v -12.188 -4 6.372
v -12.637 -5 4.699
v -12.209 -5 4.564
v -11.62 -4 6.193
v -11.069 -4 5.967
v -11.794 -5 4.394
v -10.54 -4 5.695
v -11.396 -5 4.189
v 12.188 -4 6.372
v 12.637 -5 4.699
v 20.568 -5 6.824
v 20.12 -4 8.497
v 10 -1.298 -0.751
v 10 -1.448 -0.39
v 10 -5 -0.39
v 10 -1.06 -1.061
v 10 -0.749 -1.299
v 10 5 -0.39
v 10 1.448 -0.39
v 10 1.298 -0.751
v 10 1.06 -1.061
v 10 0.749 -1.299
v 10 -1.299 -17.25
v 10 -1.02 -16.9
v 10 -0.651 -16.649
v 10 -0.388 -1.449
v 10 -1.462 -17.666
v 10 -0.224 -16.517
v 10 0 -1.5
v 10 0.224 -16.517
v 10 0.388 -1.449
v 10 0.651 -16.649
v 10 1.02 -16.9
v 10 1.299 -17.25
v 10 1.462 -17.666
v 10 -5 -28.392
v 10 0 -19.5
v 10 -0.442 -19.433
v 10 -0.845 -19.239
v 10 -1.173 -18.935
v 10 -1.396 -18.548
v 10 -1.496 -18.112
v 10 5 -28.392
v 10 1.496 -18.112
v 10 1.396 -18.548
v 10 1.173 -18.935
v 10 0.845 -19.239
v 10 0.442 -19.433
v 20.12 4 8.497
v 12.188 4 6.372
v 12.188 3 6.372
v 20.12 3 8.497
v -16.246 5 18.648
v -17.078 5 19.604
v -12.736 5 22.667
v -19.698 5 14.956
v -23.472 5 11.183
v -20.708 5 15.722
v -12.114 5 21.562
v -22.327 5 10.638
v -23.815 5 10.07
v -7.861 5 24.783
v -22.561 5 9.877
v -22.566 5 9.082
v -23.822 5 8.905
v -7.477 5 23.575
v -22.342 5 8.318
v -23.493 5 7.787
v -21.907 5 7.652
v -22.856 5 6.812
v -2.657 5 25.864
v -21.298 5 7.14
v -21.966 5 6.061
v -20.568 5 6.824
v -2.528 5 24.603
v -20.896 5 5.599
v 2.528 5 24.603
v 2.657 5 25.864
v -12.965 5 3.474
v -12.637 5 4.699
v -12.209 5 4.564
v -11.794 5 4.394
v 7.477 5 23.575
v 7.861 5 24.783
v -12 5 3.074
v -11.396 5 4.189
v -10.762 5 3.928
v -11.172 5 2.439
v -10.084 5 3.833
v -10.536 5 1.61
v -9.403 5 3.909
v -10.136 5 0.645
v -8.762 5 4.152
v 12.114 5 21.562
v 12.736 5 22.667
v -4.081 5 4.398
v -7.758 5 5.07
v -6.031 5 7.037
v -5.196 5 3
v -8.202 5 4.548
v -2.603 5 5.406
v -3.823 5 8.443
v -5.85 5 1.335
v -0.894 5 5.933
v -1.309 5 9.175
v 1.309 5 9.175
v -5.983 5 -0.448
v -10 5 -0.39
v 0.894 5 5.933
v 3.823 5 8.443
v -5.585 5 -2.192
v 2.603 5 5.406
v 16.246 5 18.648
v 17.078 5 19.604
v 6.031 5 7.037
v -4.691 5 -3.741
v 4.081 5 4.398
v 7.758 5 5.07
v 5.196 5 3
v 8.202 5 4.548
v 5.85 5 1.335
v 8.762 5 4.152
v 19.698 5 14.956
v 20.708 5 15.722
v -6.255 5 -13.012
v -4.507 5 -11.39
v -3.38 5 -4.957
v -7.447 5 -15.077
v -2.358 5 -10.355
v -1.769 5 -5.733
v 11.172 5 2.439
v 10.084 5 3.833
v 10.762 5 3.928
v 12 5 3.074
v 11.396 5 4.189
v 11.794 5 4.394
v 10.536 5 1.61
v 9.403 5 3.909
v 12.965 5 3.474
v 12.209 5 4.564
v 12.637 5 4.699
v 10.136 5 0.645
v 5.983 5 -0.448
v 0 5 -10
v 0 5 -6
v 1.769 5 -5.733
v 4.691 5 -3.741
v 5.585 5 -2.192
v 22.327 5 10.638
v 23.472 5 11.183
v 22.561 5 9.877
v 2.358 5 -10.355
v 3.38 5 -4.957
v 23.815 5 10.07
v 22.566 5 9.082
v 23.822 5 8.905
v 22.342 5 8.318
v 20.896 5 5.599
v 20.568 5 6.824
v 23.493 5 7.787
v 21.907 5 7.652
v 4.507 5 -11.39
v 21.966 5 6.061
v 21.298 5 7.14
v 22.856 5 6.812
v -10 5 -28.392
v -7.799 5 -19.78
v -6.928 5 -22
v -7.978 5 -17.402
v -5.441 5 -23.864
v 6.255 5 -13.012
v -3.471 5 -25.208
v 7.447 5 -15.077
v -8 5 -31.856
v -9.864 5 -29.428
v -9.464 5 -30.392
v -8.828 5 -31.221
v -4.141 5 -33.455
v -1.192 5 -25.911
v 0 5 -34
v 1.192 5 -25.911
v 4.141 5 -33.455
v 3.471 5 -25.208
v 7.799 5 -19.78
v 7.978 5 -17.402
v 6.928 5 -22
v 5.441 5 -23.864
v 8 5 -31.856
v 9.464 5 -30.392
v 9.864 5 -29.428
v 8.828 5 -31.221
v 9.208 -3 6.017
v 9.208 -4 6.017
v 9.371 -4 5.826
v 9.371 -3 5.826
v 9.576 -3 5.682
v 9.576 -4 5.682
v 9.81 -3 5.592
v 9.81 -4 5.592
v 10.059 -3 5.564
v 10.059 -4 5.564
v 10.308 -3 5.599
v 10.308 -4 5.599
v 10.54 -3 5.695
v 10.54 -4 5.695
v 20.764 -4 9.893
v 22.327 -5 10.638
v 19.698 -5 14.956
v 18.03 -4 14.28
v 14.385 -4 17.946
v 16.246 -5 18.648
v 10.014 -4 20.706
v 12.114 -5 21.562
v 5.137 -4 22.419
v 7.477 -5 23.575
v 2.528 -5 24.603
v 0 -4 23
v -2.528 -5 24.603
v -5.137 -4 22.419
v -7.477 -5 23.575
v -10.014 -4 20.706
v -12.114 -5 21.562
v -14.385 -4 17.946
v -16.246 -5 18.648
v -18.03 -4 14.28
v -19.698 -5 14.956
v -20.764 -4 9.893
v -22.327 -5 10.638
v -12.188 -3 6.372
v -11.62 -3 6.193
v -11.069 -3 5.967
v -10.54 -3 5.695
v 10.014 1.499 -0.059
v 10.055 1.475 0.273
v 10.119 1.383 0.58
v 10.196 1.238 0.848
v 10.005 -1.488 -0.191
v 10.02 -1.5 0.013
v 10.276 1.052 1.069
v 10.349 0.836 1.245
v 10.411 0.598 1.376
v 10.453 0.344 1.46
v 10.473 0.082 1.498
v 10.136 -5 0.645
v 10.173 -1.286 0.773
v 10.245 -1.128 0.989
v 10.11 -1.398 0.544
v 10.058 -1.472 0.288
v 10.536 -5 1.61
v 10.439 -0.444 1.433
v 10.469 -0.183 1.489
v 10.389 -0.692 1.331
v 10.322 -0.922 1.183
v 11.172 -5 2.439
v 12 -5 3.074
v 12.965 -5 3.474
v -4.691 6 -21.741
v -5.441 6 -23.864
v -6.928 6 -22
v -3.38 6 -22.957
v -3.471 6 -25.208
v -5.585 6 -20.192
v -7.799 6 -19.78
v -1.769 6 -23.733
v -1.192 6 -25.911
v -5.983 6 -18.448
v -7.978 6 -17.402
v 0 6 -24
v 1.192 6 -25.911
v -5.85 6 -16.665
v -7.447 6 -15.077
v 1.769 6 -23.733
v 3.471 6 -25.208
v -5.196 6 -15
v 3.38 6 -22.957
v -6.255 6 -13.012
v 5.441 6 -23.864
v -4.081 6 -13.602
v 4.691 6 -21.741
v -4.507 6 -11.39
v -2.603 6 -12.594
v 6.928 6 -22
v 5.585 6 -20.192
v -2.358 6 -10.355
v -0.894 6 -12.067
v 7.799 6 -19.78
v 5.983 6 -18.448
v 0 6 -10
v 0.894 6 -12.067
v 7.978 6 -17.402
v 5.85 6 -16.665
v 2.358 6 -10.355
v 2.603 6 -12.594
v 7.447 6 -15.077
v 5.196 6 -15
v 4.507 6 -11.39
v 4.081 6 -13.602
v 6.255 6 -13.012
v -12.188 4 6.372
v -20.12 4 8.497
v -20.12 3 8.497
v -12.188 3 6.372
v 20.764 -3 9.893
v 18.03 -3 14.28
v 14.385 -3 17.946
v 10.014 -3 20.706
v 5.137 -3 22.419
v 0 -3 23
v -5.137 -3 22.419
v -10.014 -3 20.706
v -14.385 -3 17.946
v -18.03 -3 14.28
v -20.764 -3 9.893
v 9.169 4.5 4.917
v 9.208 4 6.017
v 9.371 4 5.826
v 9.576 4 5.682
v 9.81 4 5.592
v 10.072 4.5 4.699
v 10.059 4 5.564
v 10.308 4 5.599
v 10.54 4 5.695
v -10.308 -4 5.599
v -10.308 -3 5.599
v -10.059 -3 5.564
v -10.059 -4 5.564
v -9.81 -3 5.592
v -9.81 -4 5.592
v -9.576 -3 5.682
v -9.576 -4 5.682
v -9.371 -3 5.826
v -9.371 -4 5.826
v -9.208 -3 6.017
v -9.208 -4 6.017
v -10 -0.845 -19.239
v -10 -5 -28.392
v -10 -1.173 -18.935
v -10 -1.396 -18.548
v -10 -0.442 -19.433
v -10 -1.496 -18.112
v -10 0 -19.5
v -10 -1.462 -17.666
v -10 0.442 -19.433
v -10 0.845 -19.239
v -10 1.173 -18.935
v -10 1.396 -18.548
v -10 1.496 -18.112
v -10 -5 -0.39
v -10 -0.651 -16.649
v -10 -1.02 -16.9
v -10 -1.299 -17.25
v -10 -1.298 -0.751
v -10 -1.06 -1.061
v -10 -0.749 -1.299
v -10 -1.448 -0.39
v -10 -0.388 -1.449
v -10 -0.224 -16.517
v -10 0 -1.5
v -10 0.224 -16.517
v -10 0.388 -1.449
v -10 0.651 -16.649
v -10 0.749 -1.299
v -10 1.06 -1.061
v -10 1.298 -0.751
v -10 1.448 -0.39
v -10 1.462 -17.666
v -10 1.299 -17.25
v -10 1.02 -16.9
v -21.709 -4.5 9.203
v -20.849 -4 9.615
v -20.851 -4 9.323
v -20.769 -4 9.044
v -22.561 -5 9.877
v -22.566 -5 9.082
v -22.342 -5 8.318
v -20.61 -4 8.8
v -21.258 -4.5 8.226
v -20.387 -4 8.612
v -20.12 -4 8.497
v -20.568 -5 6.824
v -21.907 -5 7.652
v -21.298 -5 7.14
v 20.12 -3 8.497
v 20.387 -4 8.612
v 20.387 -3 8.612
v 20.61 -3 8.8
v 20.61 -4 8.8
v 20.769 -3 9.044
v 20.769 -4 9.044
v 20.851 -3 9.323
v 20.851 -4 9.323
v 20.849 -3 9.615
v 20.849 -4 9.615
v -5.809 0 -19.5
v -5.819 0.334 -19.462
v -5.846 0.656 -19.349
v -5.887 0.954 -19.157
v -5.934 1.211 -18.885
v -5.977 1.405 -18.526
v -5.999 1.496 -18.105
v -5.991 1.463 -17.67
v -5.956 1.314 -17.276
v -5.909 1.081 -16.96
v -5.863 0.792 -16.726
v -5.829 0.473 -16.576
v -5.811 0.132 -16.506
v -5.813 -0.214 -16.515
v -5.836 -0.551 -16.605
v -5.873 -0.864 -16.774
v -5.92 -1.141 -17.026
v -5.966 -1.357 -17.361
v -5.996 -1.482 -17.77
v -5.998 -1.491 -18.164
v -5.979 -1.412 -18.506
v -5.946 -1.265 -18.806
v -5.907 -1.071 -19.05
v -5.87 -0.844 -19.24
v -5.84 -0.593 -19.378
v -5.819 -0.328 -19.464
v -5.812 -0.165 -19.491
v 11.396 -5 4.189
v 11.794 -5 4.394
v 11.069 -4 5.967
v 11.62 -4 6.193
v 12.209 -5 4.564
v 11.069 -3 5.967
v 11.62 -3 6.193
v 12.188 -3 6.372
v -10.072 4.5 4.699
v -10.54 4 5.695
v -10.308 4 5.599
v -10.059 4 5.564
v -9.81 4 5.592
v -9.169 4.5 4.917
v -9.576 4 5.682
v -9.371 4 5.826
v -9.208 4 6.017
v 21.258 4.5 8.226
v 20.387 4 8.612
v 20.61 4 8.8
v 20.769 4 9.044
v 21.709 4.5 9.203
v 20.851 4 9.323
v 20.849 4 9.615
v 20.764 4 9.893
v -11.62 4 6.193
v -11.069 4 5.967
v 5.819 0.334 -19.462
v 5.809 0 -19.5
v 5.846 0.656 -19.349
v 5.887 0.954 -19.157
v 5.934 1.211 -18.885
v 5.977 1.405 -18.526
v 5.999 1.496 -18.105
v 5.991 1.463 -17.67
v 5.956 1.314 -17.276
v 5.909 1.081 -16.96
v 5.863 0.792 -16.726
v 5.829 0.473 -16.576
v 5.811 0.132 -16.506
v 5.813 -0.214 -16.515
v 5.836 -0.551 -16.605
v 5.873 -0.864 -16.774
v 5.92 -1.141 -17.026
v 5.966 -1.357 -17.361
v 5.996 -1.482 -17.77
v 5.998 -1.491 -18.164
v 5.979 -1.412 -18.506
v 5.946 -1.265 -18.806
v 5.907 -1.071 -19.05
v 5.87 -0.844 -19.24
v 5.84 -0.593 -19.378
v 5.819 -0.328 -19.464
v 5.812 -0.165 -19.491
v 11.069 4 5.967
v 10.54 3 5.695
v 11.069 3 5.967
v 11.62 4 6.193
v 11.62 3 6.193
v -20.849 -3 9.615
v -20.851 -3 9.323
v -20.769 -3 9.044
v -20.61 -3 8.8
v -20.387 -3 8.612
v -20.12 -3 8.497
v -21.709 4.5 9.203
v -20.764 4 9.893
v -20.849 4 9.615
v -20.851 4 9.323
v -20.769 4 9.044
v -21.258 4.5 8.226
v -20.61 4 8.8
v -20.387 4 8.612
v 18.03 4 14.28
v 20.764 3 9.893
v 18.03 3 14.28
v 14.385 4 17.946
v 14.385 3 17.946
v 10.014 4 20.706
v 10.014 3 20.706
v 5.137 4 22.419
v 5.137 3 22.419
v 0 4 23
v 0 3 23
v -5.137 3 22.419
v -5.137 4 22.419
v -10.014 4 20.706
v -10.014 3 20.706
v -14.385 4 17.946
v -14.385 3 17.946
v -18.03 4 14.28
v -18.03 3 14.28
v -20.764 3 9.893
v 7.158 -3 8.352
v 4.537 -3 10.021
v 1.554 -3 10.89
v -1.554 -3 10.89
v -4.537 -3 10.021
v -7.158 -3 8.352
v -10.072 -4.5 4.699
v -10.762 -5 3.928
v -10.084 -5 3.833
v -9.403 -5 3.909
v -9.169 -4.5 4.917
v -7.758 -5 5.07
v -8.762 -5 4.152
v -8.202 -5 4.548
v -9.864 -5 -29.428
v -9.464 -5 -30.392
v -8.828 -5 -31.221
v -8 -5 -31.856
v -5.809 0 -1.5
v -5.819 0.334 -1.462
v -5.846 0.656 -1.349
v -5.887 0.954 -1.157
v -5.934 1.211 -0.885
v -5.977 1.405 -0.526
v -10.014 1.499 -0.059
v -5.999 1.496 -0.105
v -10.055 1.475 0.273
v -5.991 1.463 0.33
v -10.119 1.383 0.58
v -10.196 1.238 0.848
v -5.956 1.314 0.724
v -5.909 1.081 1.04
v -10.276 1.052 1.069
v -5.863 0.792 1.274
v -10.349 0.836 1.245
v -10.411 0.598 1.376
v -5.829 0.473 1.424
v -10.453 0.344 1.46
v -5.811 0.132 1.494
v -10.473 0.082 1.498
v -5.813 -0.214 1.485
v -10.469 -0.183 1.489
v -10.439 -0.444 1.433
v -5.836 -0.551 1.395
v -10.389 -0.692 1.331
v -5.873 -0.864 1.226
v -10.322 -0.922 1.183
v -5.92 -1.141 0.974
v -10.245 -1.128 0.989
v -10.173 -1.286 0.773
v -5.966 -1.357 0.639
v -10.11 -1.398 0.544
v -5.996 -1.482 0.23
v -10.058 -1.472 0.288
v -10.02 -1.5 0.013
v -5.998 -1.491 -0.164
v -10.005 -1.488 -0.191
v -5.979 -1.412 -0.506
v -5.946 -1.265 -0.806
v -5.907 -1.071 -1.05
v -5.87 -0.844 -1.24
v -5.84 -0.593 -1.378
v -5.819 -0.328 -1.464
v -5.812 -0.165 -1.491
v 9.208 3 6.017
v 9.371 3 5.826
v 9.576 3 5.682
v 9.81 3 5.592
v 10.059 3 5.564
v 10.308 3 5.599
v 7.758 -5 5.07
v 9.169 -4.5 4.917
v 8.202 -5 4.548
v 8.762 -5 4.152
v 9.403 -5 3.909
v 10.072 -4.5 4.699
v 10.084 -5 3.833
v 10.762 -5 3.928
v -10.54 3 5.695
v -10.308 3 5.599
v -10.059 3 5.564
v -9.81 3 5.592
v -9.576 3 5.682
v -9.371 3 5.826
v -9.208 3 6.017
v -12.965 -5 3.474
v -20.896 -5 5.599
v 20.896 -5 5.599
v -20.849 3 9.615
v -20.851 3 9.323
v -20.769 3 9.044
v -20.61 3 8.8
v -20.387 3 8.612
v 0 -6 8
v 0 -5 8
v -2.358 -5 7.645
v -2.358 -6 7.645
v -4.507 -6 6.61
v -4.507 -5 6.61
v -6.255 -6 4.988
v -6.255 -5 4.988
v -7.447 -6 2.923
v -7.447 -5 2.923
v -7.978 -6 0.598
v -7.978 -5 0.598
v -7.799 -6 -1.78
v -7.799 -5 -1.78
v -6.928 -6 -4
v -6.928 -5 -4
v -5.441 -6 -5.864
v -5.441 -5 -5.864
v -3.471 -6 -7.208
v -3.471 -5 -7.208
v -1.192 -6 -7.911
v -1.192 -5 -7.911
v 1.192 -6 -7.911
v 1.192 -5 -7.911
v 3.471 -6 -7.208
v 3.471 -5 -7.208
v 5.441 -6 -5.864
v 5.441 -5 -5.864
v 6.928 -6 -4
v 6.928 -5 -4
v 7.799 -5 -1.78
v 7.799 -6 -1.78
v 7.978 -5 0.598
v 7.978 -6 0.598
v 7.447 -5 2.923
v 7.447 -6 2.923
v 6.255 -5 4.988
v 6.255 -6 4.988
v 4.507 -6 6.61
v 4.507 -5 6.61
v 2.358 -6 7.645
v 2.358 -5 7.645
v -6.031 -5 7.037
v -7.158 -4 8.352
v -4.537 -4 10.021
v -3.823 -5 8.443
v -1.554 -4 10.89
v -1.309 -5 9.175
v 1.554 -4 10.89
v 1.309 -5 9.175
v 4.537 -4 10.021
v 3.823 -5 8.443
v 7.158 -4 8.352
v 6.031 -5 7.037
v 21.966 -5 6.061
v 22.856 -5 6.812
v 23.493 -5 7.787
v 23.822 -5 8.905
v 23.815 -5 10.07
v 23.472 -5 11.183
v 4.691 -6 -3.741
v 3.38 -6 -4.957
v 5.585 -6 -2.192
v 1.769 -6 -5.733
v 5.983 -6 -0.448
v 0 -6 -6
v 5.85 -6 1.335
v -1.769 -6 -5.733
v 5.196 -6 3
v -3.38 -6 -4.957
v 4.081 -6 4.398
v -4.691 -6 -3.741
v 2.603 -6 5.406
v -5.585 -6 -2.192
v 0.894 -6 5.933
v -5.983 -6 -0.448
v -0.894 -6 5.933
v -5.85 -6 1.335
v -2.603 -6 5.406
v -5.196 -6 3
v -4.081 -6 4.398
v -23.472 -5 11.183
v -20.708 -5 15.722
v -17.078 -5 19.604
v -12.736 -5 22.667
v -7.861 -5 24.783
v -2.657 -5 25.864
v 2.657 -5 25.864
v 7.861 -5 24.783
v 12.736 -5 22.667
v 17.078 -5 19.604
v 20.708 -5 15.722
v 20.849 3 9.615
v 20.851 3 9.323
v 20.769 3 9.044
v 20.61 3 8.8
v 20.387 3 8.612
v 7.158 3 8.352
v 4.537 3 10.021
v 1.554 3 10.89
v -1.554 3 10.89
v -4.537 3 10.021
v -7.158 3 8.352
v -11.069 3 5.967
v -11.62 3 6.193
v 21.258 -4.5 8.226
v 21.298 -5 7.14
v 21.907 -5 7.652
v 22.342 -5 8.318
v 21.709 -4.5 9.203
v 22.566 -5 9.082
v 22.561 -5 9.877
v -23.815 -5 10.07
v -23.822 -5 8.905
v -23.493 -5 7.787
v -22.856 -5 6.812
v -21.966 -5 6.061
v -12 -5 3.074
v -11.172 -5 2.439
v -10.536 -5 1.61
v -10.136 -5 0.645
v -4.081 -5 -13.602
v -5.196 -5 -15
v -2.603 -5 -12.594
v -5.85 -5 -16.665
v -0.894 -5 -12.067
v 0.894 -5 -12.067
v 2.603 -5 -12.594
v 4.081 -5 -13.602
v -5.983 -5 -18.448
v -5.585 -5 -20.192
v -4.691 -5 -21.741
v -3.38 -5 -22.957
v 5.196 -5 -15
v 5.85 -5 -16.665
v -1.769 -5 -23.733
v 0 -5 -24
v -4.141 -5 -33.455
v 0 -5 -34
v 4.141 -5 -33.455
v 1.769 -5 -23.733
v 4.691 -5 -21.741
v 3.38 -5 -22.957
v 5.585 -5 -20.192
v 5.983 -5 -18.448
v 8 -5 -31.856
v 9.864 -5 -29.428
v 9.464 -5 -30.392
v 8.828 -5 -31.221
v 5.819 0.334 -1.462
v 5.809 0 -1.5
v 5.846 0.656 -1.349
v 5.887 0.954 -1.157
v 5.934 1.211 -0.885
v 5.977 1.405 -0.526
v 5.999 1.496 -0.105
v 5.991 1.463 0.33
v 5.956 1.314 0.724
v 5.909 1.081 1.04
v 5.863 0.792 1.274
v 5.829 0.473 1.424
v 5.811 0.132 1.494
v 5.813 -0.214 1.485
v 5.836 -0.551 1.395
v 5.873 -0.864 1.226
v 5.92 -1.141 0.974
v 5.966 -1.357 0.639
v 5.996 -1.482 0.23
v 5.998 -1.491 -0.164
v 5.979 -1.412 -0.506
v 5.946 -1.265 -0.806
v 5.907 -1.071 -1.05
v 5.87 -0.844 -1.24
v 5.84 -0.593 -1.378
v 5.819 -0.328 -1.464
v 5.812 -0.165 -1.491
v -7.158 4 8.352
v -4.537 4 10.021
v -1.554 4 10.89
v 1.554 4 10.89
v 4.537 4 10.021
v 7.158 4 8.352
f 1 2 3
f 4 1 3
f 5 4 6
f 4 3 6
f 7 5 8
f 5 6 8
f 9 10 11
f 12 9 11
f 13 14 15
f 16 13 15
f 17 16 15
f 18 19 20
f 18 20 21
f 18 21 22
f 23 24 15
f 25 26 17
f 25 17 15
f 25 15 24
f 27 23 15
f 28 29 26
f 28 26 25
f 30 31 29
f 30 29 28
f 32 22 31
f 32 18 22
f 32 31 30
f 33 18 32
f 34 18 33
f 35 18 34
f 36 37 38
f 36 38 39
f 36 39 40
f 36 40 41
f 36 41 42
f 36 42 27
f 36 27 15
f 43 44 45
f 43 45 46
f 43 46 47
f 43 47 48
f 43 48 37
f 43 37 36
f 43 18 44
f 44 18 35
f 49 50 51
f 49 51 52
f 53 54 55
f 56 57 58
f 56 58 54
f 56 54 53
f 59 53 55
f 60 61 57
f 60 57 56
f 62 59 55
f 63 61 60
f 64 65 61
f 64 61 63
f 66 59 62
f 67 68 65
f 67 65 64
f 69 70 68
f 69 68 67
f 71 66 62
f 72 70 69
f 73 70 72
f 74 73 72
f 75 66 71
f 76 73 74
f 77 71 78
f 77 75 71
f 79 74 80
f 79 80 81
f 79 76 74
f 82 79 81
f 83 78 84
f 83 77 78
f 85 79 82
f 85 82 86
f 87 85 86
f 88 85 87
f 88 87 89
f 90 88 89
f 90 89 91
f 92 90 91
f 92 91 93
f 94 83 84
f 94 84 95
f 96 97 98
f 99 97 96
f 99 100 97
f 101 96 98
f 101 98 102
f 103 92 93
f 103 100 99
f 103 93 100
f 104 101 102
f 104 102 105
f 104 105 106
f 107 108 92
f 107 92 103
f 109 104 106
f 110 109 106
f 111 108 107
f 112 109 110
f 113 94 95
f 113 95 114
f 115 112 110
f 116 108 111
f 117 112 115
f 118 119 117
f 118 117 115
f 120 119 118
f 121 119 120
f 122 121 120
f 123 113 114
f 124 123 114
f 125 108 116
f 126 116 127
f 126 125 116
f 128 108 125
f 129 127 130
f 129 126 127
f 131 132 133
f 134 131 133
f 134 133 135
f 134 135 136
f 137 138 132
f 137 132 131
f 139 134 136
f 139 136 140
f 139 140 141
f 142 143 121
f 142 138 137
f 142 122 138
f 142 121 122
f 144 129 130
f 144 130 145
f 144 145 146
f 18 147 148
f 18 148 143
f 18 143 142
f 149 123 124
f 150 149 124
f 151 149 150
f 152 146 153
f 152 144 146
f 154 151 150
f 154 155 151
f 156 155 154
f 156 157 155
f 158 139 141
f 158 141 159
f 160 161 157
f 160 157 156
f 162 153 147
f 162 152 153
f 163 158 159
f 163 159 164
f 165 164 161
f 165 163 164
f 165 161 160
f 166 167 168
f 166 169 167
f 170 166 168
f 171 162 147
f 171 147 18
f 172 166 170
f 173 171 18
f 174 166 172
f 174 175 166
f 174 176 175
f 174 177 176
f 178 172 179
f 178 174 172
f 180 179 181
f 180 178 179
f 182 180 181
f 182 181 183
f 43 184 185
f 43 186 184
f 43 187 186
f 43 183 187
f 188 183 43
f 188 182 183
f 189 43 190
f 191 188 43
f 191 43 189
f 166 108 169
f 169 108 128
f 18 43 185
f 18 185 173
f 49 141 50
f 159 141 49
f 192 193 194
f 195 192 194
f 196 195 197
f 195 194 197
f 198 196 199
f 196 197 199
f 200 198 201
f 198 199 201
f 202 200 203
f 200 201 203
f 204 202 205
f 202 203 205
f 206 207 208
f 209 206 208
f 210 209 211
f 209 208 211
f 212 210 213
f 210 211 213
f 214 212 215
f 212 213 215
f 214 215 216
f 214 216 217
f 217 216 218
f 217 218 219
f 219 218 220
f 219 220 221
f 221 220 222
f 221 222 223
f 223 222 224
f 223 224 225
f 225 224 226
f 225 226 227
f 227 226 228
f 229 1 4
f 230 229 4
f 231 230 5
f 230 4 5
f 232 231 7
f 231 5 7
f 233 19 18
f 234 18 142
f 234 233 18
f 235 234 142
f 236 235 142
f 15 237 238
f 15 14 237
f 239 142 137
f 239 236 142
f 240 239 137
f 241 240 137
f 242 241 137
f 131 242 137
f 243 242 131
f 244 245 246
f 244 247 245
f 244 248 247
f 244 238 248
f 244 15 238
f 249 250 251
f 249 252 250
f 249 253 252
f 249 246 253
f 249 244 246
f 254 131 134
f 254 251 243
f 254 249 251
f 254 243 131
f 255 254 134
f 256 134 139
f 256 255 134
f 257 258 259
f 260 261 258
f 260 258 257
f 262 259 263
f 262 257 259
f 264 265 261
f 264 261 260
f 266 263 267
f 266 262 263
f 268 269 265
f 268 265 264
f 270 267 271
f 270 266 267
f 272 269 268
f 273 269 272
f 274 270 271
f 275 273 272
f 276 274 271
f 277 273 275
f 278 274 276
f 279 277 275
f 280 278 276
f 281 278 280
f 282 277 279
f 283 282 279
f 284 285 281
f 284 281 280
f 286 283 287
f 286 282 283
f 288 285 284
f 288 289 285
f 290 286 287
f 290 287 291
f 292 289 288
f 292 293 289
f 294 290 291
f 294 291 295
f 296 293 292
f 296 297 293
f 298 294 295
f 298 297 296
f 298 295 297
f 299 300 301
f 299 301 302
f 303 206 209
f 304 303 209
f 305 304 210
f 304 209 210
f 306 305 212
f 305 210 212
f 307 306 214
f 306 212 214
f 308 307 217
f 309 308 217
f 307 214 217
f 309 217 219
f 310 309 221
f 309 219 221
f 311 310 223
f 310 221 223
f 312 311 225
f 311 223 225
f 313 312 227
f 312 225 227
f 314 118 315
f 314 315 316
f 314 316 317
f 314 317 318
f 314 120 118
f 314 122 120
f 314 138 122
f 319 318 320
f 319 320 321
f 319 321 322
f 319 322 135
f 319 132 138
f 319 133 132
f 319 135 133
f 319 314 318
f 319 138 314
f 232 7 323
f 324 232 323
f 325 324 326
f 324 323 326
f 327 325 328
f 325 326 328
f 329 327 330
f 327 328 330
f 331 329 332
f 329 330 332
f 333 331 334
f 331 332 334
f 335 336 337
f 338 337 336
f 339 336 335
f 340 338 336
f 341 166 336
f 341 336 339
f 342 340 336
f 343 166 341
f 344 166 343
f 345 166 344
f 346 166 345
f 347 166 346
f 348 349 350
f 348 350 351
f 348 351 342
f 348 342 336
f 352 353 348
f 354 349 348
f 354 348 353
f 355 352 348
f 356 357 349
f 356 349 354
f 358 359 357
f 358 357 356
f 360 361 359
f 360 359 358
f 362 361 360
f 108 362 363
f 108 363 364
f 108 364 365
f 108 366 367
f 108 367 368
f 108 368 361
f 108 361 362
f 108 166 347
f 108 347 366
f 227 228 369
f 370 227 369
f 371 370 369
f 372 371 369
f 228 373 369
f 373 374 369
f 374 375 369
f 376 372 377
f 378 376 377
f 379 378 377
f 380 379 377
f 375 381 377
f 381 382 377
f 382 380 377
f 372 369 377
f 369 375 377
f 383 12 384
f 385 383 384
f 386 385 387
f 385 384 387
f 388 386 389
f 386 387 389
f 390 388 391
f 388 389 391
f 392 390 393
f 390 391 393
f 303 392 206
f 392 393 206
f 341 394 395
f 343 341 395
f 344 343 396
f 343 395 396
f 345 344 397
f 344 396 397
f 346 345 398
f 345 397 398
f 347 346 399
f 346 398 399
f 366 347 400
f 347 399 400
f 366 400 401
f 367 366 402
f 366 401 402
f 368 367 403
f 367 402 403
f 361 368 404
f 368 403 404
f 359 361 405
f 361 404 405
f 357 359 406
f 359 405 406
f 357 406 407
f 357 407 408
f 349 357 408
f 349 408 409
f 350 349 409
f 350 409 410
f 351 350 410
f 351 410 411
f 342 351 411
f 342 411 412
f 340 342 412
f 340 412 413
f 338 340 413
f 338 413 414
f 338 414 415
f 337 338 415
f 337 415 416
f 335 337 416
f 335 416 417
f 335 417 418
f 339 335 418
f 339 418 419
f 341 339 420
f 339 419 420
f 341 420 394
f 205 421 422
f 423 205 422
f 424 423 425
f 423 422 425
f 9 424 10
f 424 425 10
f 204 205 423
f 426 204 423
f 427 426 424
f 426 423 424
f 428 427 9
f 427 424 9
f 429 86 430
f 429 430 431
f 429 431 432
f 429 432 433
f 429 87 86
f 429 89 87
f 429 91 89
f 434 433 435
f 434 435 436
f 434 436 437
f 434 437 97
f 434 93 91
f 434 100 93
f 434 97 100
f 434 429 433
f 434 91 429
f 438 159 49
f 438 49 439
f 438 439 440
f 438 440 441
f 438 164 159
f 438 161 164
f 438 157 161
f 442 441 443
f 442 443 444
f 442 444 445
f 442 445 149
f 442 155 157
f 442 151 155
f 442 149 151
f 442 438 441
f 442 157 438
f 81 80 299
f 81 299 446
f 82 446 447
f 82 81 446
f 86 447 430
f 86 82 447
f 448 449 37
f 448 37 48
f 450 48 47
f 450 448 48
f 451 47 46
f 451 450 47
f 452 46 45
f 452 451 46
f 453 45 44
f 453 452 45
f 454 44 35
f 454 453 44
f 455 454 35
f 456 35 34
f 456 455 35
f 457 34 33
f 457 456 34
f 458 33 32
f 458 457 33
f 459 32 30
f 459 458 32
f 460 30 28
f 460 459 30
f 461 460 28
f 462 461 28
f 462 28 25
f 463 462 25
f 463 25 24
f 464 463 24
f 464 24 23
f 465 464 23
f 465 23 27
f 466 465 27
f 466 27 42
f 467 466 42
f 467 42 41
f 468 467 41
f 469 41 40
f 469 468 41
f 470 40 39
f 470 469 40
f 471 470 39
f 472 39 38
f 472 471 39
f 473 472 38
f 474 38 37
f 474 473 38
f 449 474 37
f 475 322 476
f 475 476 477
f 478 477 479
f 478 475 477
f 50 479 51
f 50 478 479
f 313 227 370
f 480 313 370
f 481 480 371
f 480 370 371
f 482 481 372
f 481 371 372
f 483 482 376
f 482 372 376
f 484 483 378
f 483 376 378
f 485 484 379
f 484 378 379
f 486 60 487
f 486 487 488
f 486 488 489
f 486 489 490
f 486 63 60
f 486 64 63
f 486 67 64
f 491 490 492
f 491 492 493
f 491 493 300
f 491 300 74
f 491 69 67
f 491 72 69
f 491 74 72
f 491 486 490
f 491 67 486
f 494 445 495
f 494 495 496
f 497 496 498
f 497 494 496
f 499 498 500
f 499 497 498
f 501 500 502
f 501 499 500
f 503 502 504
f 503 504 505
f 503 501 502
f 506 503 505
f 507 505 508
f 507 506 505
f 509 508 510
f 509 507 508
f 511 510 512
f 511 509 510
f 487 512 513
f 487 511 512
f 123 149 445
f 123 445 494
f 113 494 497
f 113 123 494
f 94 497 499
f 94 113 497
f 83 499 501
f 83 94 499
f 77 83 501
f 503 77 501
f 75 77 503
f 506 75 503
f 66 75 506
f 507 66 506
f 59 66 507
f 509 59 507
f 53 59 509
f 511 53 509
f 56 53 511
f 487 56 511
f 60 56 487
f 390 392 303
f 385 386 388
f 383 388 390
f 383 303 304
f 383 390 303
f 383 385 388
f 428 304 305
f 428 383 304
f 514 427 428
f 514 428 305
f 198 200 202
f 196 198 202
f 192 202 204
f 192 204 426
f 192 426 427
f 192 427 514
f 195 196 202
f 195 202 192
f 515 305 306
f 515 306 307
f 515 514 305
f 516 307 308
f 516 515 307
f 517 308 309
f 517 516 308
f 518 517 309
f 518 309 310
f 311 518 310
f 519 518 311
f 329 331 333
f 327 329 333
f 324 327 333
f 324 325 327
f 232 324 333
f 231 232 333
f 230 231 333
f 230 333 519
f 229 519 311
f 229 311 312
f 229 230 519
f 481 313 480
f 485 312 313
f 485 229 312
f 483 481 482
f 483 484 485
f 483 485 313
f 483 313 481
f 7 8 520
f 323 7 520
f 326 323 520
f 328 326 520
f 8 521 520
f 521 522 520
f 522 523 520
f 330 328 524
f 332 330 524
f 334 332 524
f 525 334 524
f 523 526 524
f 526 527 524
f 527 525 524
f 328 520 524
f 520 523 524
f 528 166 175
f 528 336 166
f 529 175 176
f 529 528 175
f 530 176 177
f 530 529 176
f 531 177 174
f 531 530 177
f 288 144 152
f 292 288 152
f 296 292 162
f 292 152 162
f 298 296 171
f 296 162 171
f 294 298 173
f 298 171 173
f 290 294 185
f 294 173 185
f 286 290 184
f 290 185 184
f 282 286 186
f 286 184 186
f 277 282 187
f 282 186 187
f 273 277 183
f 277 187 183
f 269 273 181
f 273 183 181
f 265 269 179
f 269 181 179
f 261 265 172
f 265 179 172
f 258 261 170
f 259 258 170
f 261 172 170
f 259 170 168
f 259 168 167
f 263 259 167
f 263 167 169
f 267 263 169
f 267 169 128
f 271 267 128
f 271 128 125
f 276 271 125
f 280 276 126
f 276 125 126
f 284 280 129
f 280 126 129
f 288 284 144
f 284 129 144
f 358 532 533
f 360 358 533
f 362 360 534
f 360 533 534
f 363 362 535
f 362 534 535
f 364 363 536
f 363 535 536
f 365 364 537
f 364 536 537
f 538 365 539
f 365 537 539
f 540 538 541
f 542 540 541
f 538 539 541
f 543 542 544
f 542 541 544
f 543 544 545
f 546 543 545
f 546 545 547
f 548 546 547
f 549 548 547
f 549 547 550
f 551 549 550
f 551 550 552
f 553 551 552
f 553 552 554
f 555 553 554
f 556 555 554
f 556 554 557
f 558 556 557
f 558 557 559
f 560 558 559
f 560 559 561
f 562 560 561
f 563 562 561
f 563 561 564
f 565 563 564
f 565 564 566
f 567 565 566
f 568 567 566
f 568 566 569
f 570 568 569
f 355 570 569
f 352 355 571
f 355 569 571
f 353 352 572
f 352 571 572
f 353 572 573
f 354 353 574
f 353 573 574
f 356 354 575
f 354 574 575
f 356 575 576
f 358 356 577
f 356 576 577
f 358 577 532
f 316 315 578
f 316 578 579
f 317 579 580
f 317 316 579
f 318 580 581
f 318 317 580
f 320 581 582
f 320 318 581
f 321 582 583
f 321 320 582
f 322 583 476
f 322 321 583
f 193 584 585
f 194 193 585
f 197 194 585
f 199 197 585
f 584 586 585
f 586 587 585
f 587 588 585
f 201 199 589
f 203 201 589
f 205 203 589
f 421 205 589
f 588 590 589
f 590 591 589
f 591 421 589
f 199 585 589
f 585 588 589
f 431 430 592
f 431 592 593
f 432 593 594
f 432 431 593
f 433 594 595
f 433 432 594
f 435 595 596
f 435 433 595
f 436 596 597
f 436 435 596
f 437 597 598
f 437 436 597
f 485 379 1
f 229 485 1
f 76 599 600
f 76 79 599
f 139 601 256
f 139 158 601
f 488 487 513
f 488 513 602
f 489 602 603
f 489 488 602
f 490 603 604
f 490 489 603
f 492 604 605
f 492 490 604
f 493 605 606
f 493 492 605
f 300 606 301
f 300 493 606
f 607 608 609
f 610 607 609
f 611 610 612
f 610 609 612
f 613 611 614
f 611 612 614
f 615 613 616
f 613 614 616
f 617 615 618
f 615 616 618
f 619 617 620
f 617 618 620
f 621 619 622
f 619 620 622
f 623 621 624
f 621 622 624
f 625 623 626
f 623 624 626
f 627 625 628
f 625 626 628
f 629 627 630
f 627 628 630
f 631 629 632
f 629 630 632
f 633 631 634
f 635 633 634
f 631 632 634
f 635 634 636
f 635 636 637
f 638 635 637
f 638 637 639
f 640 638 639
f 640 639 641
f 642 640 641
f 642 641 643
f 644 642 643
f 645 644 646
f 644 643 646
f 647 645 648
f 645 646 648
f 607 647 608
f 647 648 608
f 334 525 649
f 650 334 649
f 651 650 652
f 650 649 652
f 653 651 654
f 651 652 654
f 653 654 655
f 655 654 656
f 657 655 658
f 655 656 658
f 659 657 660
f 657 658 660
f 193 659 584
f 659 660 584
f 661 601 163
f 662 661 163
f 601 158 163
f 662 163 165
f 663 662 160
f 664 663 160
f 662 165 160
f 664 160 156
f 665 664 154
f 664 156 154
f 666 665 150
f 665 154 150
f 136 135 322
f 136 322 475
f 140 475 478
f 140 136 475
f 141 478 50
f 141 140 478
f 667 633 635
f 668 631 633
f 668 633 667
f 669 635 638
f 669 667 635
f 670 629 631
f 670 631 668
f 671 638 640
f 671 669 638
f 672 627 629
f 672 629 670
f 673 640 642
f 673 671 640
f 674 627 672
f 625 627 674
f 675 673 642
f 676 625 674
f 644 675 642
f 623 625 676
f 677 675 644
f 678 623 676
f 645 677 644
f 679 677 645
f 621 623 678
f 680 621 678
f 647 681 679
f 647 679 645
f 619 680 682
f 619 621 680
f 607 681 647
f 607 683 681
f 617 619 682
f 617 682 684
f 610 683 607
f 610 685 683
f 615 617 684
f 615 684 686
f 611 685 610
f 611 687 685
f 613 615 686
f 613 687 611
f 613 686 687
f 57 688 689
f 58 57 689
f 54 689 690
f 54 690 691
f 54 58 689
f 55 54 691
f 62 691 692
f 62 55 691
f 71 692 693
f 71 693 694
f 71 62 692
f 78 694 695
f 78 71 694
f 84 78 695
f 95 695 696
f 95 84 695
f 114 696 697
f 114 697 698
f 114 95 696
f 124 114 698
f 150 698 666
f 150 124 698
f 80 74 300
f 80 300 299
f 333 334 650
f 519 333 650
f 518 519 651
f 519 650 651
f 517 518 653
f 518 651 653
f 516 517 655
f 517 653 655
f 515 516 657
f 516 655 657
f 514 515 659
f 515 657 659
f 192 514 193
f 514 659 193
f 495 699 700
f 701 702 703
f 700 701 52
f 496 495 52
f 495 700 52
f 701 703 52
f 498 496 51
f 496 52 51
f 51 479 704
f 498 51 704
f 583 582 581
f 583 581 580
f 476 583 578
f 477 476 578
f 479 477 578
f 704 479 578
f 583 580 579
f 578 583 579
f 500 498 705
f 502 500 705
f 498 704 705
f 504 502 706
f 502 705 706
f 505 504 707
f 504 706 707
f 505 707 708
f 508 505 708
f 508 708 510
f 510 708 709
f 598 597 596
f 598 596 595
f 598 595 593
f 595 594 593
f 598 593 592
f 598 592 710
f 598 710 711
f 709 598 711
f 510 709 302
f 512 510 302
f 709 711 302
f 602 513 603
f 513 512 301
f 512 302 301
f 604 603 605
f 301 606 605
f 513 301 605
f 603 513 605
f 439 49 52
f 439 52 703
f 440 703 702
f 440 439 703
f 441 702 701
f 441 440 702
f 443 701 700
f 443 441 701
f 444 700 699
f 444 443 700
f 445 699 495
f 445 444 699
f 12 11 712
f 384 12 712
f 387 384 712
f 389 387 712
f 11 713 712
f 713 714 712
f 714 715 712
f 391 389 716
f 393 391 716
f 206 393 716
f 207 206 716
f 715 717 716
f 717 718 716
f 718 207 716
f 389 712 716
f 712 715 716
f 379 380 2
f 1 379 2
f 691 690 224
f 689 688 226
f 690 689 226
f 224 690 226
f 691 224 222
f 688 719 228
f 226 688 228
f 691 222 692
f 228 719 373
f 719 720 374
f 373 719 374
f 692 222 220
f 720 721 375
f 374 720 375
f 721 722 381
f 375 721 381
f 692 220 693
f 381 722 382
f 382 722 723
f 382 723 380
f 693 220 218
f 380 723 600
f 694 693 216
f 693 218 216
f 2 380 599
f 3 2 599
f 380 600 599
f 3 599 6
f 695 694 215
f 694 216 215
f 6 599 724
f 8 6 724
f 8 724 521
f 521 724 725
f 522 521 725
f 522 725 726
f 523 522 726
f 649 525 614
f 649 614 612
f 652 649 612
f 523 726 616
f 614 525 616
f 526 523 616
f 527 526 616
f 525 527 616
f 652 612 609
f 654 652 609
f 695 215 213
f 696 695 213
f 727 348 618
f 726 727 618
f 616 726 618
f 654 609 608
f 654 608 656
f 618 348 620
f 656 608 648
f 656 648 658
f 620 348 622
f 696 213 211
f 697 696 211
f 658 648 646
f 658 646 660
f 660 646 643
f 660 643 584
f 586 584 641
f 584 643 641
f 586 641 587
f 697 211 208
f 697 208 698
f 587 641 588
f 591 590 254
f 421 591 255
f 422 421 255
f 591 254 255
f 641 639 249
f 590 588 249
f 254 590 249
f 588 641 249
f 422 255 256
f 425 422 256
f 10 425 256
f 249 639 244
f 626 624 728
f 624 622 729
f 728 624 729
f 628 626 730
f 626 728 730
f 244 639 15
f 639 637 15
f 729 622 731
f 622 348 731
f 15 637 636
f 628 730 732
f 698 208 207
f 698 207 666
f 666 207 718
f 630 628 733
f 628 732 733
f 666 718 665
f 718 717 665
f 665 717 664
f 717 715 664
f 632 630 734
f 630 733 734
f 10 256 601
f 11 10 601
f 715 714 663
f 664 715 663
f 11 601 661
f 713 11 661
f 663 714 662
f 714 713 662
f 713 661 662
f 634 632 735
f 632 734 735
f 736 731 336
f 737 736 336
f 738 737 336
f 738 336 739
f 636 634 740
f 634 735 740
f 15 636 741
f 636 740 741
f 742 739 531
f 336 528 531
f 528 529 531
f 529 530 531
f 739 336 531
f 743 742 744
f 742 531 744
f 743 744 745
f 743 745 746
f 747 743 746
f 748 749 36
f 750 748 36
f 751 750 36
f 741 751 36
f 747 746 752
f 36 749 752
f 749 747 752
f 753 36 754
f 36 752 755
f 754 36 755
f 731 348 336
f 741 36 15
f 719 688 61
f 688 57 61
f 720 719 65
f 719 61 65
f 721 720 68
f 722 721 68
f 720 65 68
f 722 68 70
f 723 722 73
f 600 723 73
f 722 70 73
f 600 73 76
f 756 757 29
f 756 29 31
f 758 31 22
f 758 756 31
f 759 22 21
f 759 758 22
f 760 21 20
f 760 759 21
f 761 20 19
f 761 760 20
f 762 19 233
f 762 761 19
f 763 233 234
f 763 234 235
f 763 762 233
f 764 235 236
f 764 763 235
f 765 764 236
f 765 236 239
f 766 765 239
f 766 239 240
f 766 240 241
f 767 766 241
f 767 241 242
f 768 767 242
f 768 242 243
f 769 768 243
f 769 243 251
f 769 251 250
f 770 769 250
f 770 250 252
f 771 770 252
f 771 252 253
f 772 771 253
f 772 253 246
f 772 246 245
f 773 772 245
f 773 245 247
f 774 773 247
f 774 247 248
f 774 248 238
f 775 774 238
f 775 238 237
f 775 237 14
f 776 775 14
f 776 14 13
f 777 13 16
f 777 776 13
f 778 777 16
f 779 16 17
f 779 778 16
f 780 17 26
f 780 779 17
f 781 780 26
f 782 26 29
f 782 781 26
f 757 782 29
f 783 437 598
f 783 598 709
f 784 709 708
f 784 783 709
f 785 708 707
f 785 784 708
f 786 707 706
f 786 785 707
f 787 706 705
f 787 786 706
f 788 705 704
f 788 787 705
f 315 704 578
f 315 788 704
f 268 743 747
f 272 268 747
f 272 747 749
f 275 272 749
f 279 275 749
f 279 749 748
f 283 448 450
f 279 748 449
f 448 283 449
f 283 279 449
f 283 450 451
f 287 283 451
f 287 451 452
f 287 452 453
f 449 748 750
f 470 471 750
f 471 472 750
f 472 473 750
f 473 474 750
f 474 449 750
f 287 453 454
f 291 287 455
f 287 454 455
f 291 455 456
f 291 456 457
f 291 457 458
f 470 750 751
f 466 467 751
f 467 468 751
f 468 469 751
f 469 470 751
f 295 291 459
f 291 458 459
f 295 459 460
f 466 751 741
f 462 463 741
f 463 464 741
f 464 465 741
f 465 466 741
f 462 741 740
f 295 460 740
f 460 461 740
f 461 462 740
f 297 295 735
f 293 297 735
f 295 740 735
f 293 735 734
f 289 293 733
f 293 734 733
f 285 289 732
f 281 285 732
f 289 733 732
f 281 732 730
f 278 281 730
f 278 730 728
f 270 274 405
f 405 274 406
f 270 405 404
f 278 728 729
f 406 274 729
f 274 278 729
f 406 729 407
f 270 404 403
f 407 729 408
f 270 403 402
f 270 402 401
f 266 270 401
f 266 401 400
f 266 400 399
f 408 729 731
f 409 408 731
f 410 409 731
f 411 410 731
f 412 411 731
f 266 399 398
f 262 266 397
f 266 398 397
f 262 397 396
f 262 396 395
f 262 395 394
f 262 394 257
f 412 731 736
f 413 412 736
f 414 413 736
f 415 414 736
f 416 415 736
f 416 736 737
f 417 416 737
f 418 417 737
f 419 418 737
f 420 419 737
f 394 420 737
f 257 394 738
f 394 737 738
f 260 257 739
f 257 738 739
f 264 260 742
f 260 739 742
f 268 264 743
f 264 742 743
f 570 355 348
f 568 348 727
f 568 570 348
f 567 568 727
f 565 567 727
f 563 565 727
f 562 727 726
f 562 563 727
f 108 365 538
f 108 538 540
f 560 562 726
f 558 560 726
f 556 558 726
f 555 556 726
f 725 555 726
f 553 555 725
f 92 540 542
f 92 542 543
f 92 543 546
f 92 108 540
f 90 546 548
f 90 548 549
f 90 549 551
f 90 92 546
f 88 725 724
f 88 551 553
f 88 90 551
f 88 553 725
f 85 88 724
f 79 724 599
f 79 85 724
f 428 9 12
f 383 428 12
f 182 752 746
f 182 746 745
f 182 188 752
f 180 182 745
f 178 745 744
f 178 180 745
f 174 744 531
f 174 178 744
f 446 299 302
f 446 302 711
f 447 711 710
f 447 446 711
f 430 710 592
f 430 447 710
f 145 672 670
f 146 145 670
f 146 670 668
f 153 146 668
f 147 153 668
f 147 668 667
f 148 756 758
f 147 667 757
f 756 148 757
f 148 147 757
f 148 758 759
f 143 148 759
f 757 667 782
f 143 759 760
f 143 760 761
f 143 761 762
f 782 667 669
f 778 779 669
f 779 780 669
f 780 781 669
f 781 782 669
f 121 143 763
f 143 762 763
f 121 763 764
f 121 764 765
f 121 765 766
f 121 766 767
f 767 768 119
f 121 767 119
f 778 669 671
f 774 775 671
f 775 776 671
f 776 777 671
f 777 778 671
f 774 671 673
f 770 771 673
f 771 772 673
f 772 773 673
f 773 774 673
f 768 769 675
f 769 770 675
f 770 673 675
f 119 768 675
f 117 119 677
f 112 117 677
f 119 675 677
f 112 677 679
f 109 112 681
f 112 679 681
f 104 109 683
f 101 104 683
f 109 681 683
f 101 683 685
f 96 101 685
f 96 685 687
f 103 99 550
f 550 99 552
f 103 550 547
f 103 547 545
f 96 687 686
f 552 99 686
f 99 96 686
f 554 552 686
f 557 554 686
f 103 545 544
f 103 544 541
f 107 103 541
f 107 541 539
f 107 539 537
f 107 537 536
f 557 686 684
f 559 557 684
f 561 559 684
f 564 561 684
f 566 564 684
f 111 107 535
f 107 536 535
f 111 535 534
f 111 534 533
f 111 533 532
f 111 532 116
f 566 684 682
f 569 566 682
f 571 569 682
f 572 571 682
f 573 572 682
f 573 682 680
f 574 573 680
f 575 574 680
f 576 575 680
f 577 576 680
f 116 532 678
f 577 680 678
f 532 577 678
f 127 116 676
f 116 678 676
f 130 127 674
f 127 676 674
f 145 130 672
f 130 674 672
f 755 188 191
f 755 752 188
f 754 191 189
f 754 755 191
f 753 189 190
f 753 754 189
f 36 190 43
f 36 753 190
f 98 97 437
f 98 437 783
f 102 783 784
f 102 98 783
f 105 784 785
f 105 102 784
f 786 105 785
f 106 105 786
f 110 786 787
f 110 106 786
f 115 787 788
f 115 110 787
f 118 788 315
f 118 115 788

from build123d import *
from OCP.BRepFilletAPI import BRepFilletAPI_MakeChamfer

# Parameters (mm, degrees)
BOSS_EXTRUDE1_DEPTH       = 5
FILLET1_R                 = 4
SKETCH2_R                 = 8
BOSS_EXTRUDE2_DEPTH       = 1
SKETCH3_R                 = 8
BOSS_EXTRUDE3_DEPTH       = 1
SKETCH4_R                 = 6
CUT_EXTRUDE1_DEPTH        = 44.235891121
CUT_EXTRUDE2_DEPTH        = 2
CHAMFER1_SIZE             = 1
CHAMFER1_SIZE2            = 1.732050808
CHAMFER1_OF_MIRROR3_SIZE  = 1
CHAMFER1_OF_MIRROR3_SIZE2 = 1.732050808
SKETCH6_R                 = 1.5
CUT_EXTRUDE3_DEPTH        = 42.968348563
CUT_EXTRUDE3_DEPTH_BACK   = 42.968348563


with BuildPart() as part:
    # Sketch1 → Boss-Extrude1 (new, symmetric)
    with BuildSketch(Plane(origin=(0, 0, 0), x_dir=(1, 0, 0), z_dir=(0, 1, 0))):
        with BuildLine():
            Line((-10, 30.489995997), (-10, -2.679491924))
            Line((-10, -2.679491924), (-25.114071484, -6.729295173))
            ThreePointArc((-25.114071484, -6.729295173), (0, -26), (25.114071484, -6.729295173))
            Line((25.114071484, -6.729295173), (10, -2.679491924))
            Line((10, -2.679491924), (10, 30.489995997))
            ThreePointArc((10, 30.489995997), (0, 34), (-10, 30.489995997))
        make_face()
    extrude(amount=BOSS_EXTRUDE1_DEPTH, both=True)

    # Fillet1
    fillet1_edges = [part.edges().sort_by_distance(p)[0] for p in [
        (10, 0, -30.489995997),
        (10, 0, 2.679491924),
        (25.114071484, 0, 6.729295173),
        (-25.114071484, 0, 6.729295173),
        (-10, 0, 2.679491924),
        (-10, 0, -30.489995997),
    ]]
    fillet(fillet1_edges, radius=FILLET1_R)

    # Sketch2 → Boss-Extrude2 (add)
    with BuildSketch(Plane.XZ.offset(5)):
        with Locations(Location((0, 0, 0), (0, 0, 90))):
            Circle(SKETCH2_R)
    extrude(amount=BOSS_EXTRUDE2_DEPTH)

    # Sketch3 → Boss-Extrude3 (add)
    with BuildSketch(Plane(origin=(0, 5, 0), x_dir=(1, 0, 0), z_dir=(0, 1, 0))):
        with Locations(Location((0, 18, 0), (0, 0, 270))):
            Circle(SKETCH3_R)
    extrude(amount=BOSS_EXTRUDE3_DEPTH)

    # Sketch4 → Cut-Extrude1 (cut, through all)
    with BuildSketch(Plane.XZ.offset(6)):
        with Locations(Location((0, 0, 0), (0, 0, 270))):
            Circle(SKETCH4_R)
        with Locations(Location((0, -18, 0), (0, 0, 270))):
            Circle(SKETCH4_R)
    extrude(amount=-CUT_EXTRUDE1_DEPTH, mode=Mode.SUBTRACT)

    # Sketch5 → Cut-Extrude2 (cut)
    with BuildSketch(Plane(origin=(0, 5, 0), x_dir=(1, 0, 0), z_dir=(0, 1, 0))):
        with BuildLine():
            Line((12.188266684, -6.371664756), (20.119713435, -8.496889508))
            ThreePointArc((20.119713435, -8.496889508), (20.768948696, -9.043962883), (20.763662316, -9.892943304))
            ThreePointArc((20.763662316, -9.892943304), (0, -23), (-20.763662316, -9.892943304))
            ThreePointArc((-20.763662316, -9.892943304), (-20.768948696, -9.043962883), (-20.119713435, -8.496889508))
            Line((-20.119713435, -8.496889508), (-12.188266684, -6.371664756))
            ThreePointArc((-12.188266684, -6.371664756), (-11.342355786, -6.086056673), (-10.539679728, -5.695098402))
            ThreePointArc((-10.539679728, -5.695098402), (-9.810114884, -5.592432974), (-9.208235905, -6.017340901))
            ThreePointArc((-9.208235905, -6.017340901), (0, -11), (9.208235905, -6.017340901))
            ThreePointArc((9.208235905, -6.017340901), (9.810114884, -5.592432974), (10.539679728, -5.695098402))
            ThreePointArc((10.539679728, -5.695098402), (11.342355786, -6.086056673), (12.188266684, -6.371664756))
        make_face()
    cut_extrude2 = extrude(amount=-CUT_EXTRUDE2_DEPTH, mode=Mode.SUBTRACT)

    # Chamfer1: one chamfer whose edges measure the first distance from different faces: ONE call of the kernel's chamfer builder (chamfer() names one face for all edges)
    chamfer1_edges_1 = [part.edges().sort_by_distance(p)[0] for p in [
        (9.810114884, 5, 5.592432974),
    ]]
    chamfer1_side_1 = [part.faces().sort_by_distance(p)[0] for p in [
        (9.810114884, 4, 5.592432974),
    ]]
    chamfer1_edges_2 = [part.edges().sort_by_distance(p)[0] for p in [
        (0, 5, 11),
    ]]
    chamfer1_side_2 = [part.faces().sort_by_distance(p)[0] for p in [
        (0, 4, 11),
    ]]
    chamfer1_edges_3 = [part.edges().sort_by_distance(p)[0] for p in [
        (-9.810114884, 5, 5.592432974),
    ]]
    chamfer1_side_3 = [part.faces().sort_by_distance(p)[0] for p in [
        (-9.810114884, 4, 5.592432974),
    ]]
    chamfer1_edges_4 = [part.edges().sort_by_distance(p)[0] for p in [
        (-11.342355786, 5, 6.086056673),
    ]]
    chamfer1_side_4 = [part.faces().sort_by_distance(p)[0] for p in [
        (-11.342355786, 4, 6.086056673),
    ]]
    chamfer1_edges_5 = [part.edges().sort_by_distance(p)[0] for p in [
        (-16.153990059, 5, 7.434277132),
    ]]
    chamfer1_side_5 = [part.faces().sort_by_distance(p)[0] for p in [
        (-16.153990059, 4, 7.434277132),
    ]]
    chamfer1_edges_6 = [part.edges().sort_by_distance(p)[0] for p in [
        (-20.768948696, 5, 9.043962883),
    ]]
    chamfer1_side_6 = [part.faces().sort_by_distance(p)[0] for p in [
        (-20.768948696, 4, 9.043962883),
    ]]
    chamfer1_edges_7 = [part.edges().sort_by_distance(p)[0] for p in [
        (0, 5, 23),
    ]]
    chamfer1_side_7 = [part.faces().sort_by_distance(p)[0] for p in [
        (0, 4, 23),
    ]]
    chamfer1_edges_8 = [part.edges().sort_by_distance(p)[0] for p in [
        (20.768948696, 5, 9.043962883),
    ]]
    chamfer1_side_8 = [part.faces().sort_by_distance(p)[0] for p in [
        (20.768948696, 4, 9.043962883),
    ]]
    chamfer1_edges_9 = [part.edges().sort_by_distance(p)[0] for p in [
        (16.153990059, 5, 7.434277132),
    ]]
    chamfer1_side_9 = [part.faces().sort_by_distance(p)[0] for p in [
        (16.153990059, 4, 7.434277132),
    ]]
    chamfer1_edges_10 = [part.edges().sort_by_distance(p)[0] for p in [
        (11.342355786, 5, 6.086056673),
    ]]
    chamfer1_side_10 = [part.faces().sort_by_distance(p)[0] for p in [
        (11.342355786, 4, 6.086056673),
    ]]
    chamfer1 = BRepFilletAPI_MakeChamfer(part.part.solid().wrapped)
    for e in chamfer1_edges_1:
        chamfer1.Add(CHAMFER1_SIZE, CHAMFER1_SIZE2, e.wrapped, chamfer1_side_1[0].wrapped)  # the first distance lies on this face
    for e in chamfer1_edges_2:
        chamfer1.Add(CHAMFER1_SIZE, CHAMFER1_SIZE2, e.wrapped, chamfer1_side_2[0].wrapped)  # the first distance lies on this face
    for e in chamfer1_edges_3:
        chamfer1.Add(CHAMFER1_SIZE, CHAMFER1_SIZE2, e.wrapped, chamfer1_side_3[0].wrapped)  # the first distance lies on this face
    for e in chamfer1_edges_4:
        chamfer1.Add(CHAMFER1_SIZE, CHAMFER1_SIZE2, e.wrapped, chamfer1_side_4[0].wrapped)  # the first distance lies on this face
    for e in chamfer1_edges_5:
        chamfer1.Add(CHAMFER1_SIZE, CHAMFER1_SIZE2, e.wrapped, chamfer1_side_5[0].wrapped)  # the first distance lies on this face
    for e in chamfer1_edges_6:
        chamfer1.Add(CHAMFER1_SIZE, CHAMFER1_SIZE2, e.wrapped, chamfer1_side_6[0].wrapped)  # the first distance lies on this face
    for e in chamfer1_edges_7:
        chamfer1.Add(CHAMFER1_SIZE, CHAMFER1_SIZE2, e.wrapped, chamfer1_side_7[0].wrapped)  # the first distance lies on this face
    for e in chamfer1_edges_8:
        chamfer1.Add(CHAMFER1_SIZE, CHAMFER1_SIZE2, e.wrapped, chamfer1_side_8[0].wrapped)  # the first distance lies on this face
    for e in chamfer1_edges_9:
        chamfer1.Add(CHAMFER1_SIZE, CHAMFER1_SIZE2, e.wrapped, chamfer1_side_9[0].wrapped)  # the first distance lies on this face
    for e in chamfer1_edges_10:
        chamfer1.Add(CHAMFER1_SIZE, CHAMFER1_SIZE2, e.wrapped, chamfer1_side_10[0].wrapped)  # the first distance lies on this face
    add(Compound.cast(chamfer1.Shape()), mode=Mode.REPLACE)

    # Mirror3: Cut-Extrude2 across plane
    add(cut_extrude2.mirror(Plane.ZX), mode=Mode.SUBTRACT)

    # Chamfer1 of Mirror3: one chamfer whose edges measure the first distance from different faces: ONE call of the kernel's chamfer builder (chamfer() names one face for all edges)
    chamfer1_of_mirror3_edges_1 = [part.edges().sort_by_distance(p)[0] for p in [
        (9.810114884, -5, 5.592432974),
    ]]
    chamfer1_of_mirror3_side_1 = [part.faces().sort_by_distance(p)[0] for p in [
        (9.810114884, -4, 5.592432974),
    ]]
    chamfer1_of_mirror3_edges_2 = [part.edges().sort_by_distance(p)[0] for p in [
        (0, -5, 11),
    ]]
    chamfer1_of_mirror3_side_2 = [part.faces().sort_by_distance(p)[0] for p in [
        (0, -4, 11),
    ]]
    chamfer1_of_mirror3_edges_3 = [part.edges().sort_by_distance(p)[0] for p in [
        (-9.810114884, -5, 5.592432974),
    ]]
    chamfer1_of_mirror3_side_3 = [part.faces().sort_by_distance(p)[0] for p in [
        (-9.810114884, -4, 5.592432974),
    ]]
    chamfer1_of_mirror3_edges_4 = [part.edges().sort_by_distance(p)[0] for p in [
        (-11.342355786, -5, 6.086056673),
    ]]
    chamfer1_of_mirror3_side_4 = [part.faces().sort_by_distance(p)[0] for p in [
        (-11.342355786, -4, 6.086056673),
    ]]
    chamfer1_of_mirror3_edges_5 = [part.edges().sort_by_distance(p)[0] for p in [
        (-16.153990059, -5, 7.434277132),
    ]]
    chamfer1_of_mirror3_side_5 = [part.faces().sort_by_distance(p)[0] for p in [
        (-16.153990059, -4, 7.434277132),
    ]]
    chamfer1_of_mirror3_edges_6 = [part.edges().sort_by_distance(p)[0] for p in [
        (-20.768948696, -5, 9.043962883),
    ]]
    chamfer1_of_mirror3_side_6 = [part.faces().sort_by_distance(p)[0] for p in [
        (-20.768948696, -4, 9.043962883),
    ]]
    chamfer1_of_mirror3_edges_7 = [part.edges().sort_by_distance(p)[0] for p in [
        (0, -5, 23),
    ]]
    chamfer1_of_mirror3_side_7 = [part.faces().sort_by_distance(p)[0] for p in [
        (0, -4, 23),
    ]]
    chamfer1_of_mirror3_edges_8 = [part.edges().sort_by_distance(p)[0] for p in [
        (20.768948696, -5, 9.043962883),
    ]]
    chamfer1_of_mirror3_side_8 = [part.faces().sort_by_distance(p)[0] for p in [
        (20.768948696, -4, 9.043962883),
    ]]
    chamfer1_of_mirror3_edges_9 = [part.edges().sort_by_distance(p)[0] for p in [
        (16.153990059, -5, 7.434277132),
    ]]
    chamfer1_of_mirror3_side_9 = [part.faces().sort_by_distance(p)[0] for p in [
        (16.153990059, -4, 7.434277132),
    ]]
    chamfer1_of_mirror3_edges_10 = [part.edges().sort_by_distance(p)[0] for p in [
        (11.342355786, -5, 6.086056673),
    ]]
    chamfer1_of_mirror3_side_10 = [part.faces().sort_by_distance(p)[0] for p in [
        (11.342355786, -4, 6.086056673),
    ]]
    chamfer1_of_mirror3 = BRepFilletAPI_MakeChamfer(part.part.solid().wrapped)
    for e in chamfer1_of_mirror3_edges_1:
        chamfer1_of_mirror3.Add(CHAMFER1_OF_MIRROR3_SIZE, CHAMFER1_OF_MIRROR3_SIZE2, e.wrapped, chamfer1_of_mirror3_side_1[0].wrapped)  # the first distance lies on this face
    for e in chamfer1_of_mirror3_edges_2:
        chamfer1_of_mirror3.Add(CHAMFER1_OF_MIRROR3_SIZE, CHAMFER1_OF_MIRROR3_SIZE2, e.wrapped, chamfer1_of_mirror3_side_2[0].wrapped)  # the first distance lies on this face
    for e in chamfer1_of_mirror3_edges_3:
        chamfer1_of_mirror3.Add(CHAMFER1_OF_MIRROR3_SIZE, CHAMFER1_OF_MIRROR3_SIZE2, e.wrapped, chamfer1_of_mirror3_side_3[0].wrapped)  # the first distance lies on this face
    for e in chamfer1_of_mirror3_edges_4:
        chamfer1_of_mirror3.Add(CHAMFER1_OF_MIRROR3_SIZE, CHAMFER1_OF_MIRROR3_SIZE2, e.wrapped, chamfer1_of_mirror3_side_4[0].wrapped)  # the first distance lies on this face
    for e in chamfer1_of_mirror3_edges_5:
        chamfer1_of_mirror3.Add(CHAMFER1_OF_MIRROR3_SIZE, CHAMFER1_OF_MIRROR3_SIZE2, e.wrapped, chamfer1_of_mirror3_side_5[0].wrapped)  # the first distance lies on this face
    for e in chamfer1_of_mirror3_edges_6:
        chamfer1_of_mirror3.Add(CHAMFER1_OF_MIRROR3_SIZE, CHAMFER1_OF_MIRROR3_SIZE2, e.wrapped, chamfer1_of_mirror3_side_6[0].wrapped)  # the first distance lies on this face
    for e in chamfer1_of_mirror3_edges_7:
        chamfer1_of_mirror3.Add(CHAMFER1_OF_MIRROR3_SIZE, CHAMFER1_OF_MIRROR3_SIZE2, e.wrapped, chamfer1_of_mirror3_side_7[0].wrapped)  # the first distance lies on this face
    for e in chamfer1_of_mirror3_edges_8:
        chamfer1_of_mirror3.Add(CHAMFER1_OF_MIRROR3_SIZE, CHAMFER1_OF_MIRROR3_SIZE2, e.wrapped, chamfer1_of_mirror3_side_8[0].wrapped)  # the first distance lies on this face
    for e in chamfer1_of_mirror3_edges_9:
        chamfer1_of_mirror3.Add(CHAMFER1_OF_MIRROR3_SIZE, CHAMFER1_OF_MIRROR3_SIZE2, e.wrapped, chamfer1_of_mirror3_side_9[0].wrapped)  # the first distance lies on this face
    for e in chamfer1_of_mirror3_edges_10:
        chamfer1_of_mirror3.Add(CHAMFER1_OF_MIRROR3_SIZE, CHAMFER1_OF_MIRROR3_SIZE2, e.wrapped, chamfer1_of_mirror3_side_10[0].wrapped)  # the first distance lies on this face
    add(Compound.cast(chamfer1_of_mirror3.Shape()), mode=Mode.REPLACE)

    # Sketch6 → Cut-Extrude3 (cut, two sides)
    with BuildSketch(Plane(origin=(0, 0, 0), x_dir=(0, 0, -1), z_dir=(1, 0, 0))) as cut_extrude3_sk:
        Circle(SKETCH6_R)
        with Locations((18, 0)):
            Circle(SKETCH6_R)
    extrude(amount=CUT_EXTRUDE3_DEPTH, mode=Mode.SUBTRACT)
    extrude(cut_extrude3_sk.sketch, amount=-CUT_EXTRUDE3_DEPTH_BACK, mode=Mode.SUBTRACT)


solid = part.part
